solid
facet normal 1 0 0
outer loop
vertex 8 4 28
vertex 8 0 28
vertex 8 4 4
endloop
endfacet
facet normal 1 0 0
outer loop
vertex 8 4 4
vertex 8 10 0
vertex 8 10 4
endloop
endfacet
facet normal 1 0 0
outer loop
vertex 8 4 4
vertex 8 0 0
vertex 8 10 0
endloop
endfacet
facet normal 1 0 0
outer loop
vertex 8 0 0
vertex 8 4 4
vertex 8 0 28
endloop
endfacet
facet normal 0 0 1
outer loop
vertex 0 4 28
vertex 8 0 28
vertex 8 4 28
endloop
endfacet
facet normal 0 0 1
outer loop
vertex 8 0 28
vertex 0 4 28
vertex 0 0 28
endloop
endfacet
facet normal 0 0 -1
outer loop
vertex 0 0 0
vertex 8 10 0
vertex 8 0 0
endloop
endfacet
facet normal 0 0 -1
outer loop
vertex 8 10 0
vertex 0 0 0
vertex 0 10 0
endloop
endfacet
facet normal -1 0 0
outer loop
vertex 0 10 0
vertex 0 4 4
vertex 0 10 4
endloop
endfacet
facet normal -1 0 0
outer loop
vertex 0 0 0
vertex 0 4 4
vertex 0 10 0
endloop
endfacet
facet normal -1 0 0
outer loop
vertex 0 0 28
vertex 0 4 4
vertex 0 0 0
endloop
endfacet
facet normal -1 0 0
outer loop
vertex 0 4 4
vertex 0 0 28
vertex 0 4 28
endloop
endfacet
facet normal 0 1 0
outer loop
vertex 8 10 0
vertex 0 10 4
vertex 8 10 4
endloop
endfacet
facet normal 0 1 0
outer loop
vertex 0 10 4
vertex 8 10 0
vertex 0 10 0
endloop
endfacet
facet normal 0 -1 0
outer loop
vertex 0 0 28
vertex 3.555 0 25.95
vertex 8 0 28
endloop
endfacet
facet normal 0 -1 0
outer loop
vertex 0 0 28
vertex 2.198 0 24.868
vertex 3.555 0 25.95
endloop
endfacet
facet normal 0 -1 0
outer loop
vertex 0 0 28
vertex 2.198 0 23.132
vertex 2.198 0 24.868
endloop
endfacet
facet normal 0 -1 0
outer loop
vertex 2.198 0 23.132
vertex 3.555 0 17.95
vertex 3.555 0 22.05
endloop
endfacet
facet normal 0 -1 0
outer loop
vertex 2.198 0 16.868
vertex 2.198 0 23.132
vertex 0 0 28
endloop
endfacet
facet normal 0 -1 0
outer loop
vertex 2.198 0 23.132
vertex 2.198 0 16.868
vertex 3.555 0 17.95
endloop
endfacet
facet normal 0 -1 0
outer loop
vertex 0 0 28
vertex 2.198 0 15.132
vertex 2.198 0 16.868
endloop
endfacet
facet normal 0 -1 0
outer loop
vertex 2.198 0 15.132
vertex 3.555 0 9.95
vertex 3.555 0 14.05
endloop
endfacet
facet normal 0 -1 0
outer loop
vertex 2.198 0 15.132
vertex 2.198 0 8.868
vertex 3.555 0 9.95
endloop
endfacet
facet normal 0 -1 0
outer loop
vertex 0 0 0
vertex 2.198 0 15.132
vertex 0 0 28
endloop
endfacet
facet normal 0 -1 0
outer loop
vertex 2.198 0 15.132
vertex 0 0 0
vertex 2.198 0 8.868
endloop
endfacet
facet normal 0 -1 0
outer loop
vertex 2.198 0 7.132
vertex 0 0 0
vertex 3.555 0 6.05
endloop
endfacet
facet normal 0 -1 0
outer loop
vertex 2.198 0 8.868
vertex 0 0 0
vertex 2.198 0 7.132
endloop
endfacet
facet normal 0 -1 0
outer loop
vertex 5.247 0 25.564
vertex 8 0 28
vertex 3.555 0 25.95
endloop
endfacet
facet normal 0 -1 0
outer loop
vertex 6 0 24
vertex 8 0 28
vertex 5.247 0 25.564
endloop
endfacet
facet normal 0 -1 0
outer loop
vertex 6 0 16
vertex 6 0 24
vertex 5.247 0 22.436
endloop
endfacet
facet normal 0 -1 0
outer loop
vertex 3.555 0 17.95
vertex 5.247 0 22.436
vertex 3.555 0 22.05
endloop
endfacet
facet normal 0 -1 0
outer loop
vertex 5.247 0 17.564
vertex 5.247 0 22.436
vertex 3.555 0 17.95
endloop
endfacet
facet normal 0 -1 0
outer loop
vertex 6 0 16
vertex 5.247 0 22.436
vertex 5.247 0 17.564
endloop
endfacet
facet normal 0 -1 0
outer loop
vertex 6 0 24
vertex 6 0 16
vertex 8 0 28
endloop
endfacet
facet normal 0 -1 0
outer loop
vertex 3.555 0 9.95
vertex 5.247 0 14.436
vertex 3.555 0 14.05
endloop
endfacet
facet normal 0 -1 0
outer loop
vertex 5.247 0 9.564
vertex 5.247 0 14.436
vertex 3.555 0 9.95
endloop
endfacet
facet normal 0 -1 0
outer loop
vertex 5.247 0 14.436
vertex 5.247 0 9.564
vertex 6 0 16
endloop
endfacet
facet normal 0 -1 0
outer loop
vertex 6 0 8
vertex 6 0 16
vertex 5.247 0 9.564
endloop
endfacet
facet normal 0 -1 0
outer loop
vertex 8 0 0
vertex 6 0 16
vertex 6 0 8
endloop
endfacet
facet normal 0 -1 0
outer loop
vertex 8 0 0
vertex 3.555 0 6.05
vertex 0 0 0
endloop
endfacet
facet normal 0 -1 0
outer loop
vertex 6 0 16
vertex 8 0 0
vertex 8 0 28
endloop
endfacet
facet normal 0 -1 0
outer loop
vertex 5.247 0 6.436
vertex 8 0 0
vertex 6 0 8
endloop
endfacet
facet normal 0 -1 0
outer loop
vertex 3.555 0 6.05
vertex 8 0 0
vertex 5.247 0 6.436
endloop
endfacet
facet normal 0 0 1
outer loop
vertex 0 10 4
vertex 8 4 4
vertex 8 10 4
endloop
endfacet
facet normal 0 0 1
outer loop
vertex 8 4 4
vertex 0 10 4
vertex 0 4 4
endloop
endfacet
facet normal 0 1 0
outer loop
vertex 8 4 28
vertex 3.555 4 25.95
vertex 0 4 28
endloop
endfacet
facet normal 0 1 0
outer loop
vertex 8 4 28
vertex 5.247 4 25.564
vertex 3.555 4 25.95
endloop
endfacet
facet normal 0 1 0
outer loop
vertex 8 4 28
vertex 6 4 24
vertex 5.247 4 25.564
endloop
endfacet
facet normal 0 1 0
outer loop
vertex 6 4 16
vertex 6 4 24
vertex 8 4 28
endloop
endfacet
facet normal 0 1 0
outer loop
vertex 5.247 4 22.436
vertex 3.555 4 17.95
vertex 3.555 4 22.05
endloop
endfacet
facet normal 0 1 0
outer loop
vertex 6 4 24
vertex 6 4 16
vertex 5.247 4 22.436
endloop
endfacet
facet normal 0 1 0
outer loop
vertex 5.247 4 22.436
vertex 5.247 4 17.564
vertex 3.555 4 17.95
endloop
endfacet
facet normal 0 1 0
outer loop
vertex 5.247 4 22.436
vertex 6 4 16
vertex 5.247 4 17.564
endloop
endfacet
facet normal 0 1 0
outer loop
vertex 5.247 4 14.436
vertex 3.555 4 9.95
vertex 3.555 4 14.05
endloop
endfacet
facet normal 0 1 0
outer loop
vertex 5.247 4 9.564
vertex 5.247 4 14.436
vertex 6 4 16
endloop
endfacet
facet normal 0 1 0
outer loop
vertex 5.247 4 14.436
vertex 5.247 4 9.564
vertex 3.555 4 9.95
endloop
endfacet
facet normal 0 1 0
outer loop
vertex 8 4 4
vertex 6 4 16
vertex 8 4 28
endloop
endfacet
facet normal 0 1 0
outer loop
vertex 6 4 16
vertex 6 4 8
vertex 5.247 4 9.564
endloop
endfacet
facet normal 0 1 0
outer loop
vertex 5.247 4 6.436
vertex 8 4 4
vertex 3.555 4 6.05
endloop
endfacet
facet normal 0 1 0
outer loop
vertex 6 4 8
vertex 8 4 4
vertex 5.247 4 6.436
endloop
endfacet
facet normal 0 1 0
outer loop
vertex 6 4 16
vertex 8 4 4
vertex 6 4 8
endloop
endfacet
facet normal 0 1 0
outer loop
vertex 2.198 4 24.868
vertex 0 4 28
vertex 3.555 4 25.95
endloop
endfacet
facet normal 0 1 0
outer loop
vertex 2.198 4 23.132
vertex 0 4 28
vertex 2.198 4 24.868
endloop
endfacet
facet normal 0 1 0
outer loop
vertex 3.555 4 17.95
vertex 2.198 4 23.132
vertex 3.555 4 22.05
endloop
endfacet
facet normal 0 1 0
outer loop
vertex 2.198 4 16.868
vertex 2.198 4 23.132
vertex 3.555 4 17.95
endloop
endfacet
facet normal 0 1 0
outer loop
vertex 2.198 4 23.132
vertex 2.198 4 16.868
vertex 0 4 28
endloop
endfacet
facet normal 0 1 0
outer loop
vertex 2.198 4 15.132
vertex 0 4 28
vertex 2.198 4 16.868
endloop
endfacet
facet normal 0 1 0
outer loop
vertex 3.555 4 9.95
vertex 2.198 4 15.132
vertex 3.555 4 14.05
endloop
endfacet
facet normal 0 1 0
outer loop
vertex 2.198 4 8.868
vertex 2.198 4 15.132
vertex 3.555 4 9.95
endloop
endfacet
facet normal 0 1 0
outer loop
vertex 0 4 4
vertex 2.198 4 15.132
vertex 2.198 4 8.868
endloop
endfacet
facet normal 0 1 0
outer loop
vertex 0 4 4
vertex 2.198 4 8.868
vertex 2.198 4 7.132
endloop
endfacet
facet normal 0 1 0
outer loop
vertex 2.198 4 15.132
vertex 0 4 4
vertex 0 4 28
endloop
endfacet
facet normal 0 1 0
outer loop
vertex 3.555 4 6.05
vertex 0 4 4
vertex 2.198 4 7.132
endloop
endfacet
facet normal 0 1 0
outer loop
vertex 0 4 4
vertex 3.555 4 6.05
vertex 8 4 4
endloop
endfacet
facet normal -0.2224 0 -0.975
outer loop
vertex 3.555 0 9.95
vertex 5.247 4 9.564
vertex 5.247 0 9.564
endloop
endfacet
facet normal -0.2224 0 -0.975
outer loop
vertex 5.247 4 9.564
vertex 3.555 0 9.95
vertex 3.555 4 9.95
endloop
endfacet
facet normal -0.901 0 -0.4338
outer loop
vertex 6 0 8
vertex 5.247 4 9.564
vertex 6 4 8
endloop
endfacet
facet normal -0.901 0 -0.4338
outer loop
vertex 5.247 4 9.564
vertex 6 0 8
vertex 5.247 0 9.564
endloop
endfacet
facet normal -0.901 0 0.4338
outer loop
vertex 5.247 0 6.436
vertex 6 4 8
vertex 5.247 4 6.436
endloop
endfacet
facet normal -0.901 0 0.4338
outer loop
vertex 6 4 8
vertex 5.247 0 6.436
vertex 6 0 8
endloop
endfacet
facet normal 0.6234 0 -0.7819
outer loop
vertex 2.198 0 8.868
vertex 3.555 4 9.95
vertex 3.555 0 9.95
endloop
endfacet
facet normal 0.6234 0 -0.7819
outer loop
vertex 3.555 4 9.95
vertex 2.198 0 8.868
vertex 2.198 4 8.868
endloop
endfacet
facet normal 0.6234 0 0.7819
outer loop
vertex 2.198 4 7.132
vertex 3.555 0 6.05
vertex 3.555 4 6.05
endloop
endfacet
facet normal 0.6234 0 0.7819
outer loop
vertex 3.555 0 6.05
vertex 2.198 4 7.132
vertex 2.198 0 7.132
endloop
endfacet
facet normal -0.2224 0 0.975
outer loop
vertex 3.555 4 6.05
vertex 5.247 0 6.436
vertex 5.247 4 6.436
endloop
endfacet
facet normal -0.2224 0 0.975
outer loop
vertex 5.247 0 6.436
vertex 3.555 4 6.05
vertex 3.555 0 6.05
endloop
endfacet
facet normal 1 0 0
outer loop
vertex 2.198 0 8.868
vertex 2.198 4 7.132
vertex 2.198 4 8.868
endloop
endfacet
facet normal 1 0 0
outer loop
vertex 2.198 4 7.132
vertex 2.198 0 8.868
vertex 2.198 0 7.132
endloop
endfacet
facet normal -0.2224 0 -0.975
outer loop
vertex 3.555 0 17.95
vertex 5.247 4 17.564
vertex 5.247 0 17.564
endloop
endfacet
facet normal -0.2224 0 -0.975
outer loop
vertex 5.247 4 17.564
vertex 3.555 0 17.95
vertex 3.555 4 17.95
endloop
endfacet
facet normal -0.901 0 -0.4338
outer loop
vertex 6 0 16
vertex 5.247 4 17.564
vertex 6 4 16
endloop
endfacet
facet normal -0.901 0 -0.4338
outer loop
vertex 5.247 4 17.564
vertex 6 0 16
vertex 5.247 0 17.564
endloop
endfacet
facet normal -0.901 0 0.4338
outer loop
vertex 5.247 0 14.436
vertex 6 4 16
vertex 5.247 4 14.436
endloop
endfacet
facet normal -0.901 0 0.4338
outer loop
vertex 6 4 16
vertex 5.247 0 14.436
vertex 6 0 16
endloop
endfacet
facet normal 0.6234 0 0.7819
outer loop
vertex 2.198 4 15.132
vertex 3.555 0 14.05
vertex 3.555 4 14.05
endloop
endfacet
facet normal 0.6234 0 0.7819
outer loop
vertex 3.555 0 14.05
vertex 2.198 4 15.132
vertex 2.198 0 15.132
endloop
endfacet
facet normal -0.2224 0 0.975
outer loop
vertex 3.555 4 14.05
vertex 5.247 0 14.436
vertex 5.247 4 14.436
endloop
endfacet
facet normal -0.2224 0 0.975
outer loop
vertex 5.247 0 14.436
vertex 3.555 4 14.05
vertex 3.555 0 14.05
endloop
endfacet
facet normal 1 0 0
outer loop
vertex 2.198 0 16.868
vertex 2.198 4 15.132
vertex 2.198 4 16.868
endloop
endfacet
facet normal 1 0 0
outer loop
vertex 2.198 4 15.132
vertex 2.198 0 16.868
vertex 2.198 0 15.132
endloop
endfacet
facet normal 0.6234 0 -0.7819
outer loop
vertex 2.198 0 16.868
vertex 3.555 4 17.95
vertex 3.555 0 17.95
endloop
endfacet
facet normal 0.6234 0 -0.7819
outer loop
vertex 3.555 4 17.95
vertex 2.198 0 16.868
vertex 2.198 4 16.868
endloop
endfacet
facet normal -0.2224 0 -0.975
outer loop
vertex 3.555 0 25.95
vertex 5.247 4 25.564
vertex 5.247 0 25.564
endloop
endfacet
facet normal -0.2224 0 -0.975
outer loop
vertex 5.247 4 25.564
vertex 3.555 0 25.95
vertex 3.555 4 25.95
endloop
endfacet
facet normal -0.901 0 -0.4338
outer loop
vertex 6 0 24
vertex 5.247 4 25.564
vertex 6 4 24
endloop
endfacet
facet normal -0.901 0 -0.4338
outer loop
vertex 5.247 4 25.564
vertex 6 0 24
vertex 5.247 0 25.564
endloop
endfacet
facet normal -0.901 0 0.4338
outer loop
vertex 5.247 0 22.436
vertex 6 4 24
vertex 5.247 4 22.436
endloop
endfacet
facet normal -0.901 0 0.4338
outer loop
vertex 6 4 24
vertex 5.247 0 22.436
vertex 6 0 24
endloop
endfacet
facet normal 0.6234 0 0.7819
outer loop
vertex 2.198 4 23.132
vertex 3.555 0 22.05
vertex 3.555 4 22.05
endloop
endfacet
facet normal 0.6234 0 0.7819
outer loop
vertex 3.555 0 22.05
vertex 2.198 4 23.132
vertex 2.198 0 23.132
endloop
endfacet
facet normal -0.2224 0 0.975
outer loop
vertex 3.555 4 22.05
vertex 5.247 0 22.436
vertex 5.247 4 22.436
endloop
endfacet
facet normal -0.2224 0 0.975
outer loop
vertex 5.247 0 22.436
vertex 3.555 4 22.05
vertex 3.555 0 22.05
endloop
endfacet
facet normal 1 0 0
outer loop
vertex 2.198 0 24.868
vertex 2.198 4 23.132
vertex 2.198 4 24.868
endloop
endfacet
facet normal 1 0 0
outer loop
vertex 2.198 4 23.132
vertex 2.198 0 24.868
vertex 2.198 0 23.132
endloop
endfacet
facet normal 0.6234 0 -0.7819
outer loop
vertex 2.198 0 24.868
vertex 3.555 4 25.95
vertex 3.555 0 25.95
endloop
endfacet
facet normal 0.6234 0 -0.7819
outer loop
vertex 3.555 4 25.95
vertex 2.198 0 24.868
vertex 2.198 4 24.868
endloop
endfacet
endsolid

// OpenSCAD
nb_rangees = 1;
difference(){
difference(){
    cube([8*nb_rangees,10,28]);
    translate([0, 4, 4]){
        cube([8*nb_rangees,28,28]);};
};


translate([0,4,0]){   
    rotate([90,0,0]){
        union(){
            for(i=[0:nb_rangees]){
                for(j=[0:2]){
                    translate([4+ 8*i, 8+8*j, 0]){cylinder(h=4, r=2);}
                }
            }
        }
    }
}


}
